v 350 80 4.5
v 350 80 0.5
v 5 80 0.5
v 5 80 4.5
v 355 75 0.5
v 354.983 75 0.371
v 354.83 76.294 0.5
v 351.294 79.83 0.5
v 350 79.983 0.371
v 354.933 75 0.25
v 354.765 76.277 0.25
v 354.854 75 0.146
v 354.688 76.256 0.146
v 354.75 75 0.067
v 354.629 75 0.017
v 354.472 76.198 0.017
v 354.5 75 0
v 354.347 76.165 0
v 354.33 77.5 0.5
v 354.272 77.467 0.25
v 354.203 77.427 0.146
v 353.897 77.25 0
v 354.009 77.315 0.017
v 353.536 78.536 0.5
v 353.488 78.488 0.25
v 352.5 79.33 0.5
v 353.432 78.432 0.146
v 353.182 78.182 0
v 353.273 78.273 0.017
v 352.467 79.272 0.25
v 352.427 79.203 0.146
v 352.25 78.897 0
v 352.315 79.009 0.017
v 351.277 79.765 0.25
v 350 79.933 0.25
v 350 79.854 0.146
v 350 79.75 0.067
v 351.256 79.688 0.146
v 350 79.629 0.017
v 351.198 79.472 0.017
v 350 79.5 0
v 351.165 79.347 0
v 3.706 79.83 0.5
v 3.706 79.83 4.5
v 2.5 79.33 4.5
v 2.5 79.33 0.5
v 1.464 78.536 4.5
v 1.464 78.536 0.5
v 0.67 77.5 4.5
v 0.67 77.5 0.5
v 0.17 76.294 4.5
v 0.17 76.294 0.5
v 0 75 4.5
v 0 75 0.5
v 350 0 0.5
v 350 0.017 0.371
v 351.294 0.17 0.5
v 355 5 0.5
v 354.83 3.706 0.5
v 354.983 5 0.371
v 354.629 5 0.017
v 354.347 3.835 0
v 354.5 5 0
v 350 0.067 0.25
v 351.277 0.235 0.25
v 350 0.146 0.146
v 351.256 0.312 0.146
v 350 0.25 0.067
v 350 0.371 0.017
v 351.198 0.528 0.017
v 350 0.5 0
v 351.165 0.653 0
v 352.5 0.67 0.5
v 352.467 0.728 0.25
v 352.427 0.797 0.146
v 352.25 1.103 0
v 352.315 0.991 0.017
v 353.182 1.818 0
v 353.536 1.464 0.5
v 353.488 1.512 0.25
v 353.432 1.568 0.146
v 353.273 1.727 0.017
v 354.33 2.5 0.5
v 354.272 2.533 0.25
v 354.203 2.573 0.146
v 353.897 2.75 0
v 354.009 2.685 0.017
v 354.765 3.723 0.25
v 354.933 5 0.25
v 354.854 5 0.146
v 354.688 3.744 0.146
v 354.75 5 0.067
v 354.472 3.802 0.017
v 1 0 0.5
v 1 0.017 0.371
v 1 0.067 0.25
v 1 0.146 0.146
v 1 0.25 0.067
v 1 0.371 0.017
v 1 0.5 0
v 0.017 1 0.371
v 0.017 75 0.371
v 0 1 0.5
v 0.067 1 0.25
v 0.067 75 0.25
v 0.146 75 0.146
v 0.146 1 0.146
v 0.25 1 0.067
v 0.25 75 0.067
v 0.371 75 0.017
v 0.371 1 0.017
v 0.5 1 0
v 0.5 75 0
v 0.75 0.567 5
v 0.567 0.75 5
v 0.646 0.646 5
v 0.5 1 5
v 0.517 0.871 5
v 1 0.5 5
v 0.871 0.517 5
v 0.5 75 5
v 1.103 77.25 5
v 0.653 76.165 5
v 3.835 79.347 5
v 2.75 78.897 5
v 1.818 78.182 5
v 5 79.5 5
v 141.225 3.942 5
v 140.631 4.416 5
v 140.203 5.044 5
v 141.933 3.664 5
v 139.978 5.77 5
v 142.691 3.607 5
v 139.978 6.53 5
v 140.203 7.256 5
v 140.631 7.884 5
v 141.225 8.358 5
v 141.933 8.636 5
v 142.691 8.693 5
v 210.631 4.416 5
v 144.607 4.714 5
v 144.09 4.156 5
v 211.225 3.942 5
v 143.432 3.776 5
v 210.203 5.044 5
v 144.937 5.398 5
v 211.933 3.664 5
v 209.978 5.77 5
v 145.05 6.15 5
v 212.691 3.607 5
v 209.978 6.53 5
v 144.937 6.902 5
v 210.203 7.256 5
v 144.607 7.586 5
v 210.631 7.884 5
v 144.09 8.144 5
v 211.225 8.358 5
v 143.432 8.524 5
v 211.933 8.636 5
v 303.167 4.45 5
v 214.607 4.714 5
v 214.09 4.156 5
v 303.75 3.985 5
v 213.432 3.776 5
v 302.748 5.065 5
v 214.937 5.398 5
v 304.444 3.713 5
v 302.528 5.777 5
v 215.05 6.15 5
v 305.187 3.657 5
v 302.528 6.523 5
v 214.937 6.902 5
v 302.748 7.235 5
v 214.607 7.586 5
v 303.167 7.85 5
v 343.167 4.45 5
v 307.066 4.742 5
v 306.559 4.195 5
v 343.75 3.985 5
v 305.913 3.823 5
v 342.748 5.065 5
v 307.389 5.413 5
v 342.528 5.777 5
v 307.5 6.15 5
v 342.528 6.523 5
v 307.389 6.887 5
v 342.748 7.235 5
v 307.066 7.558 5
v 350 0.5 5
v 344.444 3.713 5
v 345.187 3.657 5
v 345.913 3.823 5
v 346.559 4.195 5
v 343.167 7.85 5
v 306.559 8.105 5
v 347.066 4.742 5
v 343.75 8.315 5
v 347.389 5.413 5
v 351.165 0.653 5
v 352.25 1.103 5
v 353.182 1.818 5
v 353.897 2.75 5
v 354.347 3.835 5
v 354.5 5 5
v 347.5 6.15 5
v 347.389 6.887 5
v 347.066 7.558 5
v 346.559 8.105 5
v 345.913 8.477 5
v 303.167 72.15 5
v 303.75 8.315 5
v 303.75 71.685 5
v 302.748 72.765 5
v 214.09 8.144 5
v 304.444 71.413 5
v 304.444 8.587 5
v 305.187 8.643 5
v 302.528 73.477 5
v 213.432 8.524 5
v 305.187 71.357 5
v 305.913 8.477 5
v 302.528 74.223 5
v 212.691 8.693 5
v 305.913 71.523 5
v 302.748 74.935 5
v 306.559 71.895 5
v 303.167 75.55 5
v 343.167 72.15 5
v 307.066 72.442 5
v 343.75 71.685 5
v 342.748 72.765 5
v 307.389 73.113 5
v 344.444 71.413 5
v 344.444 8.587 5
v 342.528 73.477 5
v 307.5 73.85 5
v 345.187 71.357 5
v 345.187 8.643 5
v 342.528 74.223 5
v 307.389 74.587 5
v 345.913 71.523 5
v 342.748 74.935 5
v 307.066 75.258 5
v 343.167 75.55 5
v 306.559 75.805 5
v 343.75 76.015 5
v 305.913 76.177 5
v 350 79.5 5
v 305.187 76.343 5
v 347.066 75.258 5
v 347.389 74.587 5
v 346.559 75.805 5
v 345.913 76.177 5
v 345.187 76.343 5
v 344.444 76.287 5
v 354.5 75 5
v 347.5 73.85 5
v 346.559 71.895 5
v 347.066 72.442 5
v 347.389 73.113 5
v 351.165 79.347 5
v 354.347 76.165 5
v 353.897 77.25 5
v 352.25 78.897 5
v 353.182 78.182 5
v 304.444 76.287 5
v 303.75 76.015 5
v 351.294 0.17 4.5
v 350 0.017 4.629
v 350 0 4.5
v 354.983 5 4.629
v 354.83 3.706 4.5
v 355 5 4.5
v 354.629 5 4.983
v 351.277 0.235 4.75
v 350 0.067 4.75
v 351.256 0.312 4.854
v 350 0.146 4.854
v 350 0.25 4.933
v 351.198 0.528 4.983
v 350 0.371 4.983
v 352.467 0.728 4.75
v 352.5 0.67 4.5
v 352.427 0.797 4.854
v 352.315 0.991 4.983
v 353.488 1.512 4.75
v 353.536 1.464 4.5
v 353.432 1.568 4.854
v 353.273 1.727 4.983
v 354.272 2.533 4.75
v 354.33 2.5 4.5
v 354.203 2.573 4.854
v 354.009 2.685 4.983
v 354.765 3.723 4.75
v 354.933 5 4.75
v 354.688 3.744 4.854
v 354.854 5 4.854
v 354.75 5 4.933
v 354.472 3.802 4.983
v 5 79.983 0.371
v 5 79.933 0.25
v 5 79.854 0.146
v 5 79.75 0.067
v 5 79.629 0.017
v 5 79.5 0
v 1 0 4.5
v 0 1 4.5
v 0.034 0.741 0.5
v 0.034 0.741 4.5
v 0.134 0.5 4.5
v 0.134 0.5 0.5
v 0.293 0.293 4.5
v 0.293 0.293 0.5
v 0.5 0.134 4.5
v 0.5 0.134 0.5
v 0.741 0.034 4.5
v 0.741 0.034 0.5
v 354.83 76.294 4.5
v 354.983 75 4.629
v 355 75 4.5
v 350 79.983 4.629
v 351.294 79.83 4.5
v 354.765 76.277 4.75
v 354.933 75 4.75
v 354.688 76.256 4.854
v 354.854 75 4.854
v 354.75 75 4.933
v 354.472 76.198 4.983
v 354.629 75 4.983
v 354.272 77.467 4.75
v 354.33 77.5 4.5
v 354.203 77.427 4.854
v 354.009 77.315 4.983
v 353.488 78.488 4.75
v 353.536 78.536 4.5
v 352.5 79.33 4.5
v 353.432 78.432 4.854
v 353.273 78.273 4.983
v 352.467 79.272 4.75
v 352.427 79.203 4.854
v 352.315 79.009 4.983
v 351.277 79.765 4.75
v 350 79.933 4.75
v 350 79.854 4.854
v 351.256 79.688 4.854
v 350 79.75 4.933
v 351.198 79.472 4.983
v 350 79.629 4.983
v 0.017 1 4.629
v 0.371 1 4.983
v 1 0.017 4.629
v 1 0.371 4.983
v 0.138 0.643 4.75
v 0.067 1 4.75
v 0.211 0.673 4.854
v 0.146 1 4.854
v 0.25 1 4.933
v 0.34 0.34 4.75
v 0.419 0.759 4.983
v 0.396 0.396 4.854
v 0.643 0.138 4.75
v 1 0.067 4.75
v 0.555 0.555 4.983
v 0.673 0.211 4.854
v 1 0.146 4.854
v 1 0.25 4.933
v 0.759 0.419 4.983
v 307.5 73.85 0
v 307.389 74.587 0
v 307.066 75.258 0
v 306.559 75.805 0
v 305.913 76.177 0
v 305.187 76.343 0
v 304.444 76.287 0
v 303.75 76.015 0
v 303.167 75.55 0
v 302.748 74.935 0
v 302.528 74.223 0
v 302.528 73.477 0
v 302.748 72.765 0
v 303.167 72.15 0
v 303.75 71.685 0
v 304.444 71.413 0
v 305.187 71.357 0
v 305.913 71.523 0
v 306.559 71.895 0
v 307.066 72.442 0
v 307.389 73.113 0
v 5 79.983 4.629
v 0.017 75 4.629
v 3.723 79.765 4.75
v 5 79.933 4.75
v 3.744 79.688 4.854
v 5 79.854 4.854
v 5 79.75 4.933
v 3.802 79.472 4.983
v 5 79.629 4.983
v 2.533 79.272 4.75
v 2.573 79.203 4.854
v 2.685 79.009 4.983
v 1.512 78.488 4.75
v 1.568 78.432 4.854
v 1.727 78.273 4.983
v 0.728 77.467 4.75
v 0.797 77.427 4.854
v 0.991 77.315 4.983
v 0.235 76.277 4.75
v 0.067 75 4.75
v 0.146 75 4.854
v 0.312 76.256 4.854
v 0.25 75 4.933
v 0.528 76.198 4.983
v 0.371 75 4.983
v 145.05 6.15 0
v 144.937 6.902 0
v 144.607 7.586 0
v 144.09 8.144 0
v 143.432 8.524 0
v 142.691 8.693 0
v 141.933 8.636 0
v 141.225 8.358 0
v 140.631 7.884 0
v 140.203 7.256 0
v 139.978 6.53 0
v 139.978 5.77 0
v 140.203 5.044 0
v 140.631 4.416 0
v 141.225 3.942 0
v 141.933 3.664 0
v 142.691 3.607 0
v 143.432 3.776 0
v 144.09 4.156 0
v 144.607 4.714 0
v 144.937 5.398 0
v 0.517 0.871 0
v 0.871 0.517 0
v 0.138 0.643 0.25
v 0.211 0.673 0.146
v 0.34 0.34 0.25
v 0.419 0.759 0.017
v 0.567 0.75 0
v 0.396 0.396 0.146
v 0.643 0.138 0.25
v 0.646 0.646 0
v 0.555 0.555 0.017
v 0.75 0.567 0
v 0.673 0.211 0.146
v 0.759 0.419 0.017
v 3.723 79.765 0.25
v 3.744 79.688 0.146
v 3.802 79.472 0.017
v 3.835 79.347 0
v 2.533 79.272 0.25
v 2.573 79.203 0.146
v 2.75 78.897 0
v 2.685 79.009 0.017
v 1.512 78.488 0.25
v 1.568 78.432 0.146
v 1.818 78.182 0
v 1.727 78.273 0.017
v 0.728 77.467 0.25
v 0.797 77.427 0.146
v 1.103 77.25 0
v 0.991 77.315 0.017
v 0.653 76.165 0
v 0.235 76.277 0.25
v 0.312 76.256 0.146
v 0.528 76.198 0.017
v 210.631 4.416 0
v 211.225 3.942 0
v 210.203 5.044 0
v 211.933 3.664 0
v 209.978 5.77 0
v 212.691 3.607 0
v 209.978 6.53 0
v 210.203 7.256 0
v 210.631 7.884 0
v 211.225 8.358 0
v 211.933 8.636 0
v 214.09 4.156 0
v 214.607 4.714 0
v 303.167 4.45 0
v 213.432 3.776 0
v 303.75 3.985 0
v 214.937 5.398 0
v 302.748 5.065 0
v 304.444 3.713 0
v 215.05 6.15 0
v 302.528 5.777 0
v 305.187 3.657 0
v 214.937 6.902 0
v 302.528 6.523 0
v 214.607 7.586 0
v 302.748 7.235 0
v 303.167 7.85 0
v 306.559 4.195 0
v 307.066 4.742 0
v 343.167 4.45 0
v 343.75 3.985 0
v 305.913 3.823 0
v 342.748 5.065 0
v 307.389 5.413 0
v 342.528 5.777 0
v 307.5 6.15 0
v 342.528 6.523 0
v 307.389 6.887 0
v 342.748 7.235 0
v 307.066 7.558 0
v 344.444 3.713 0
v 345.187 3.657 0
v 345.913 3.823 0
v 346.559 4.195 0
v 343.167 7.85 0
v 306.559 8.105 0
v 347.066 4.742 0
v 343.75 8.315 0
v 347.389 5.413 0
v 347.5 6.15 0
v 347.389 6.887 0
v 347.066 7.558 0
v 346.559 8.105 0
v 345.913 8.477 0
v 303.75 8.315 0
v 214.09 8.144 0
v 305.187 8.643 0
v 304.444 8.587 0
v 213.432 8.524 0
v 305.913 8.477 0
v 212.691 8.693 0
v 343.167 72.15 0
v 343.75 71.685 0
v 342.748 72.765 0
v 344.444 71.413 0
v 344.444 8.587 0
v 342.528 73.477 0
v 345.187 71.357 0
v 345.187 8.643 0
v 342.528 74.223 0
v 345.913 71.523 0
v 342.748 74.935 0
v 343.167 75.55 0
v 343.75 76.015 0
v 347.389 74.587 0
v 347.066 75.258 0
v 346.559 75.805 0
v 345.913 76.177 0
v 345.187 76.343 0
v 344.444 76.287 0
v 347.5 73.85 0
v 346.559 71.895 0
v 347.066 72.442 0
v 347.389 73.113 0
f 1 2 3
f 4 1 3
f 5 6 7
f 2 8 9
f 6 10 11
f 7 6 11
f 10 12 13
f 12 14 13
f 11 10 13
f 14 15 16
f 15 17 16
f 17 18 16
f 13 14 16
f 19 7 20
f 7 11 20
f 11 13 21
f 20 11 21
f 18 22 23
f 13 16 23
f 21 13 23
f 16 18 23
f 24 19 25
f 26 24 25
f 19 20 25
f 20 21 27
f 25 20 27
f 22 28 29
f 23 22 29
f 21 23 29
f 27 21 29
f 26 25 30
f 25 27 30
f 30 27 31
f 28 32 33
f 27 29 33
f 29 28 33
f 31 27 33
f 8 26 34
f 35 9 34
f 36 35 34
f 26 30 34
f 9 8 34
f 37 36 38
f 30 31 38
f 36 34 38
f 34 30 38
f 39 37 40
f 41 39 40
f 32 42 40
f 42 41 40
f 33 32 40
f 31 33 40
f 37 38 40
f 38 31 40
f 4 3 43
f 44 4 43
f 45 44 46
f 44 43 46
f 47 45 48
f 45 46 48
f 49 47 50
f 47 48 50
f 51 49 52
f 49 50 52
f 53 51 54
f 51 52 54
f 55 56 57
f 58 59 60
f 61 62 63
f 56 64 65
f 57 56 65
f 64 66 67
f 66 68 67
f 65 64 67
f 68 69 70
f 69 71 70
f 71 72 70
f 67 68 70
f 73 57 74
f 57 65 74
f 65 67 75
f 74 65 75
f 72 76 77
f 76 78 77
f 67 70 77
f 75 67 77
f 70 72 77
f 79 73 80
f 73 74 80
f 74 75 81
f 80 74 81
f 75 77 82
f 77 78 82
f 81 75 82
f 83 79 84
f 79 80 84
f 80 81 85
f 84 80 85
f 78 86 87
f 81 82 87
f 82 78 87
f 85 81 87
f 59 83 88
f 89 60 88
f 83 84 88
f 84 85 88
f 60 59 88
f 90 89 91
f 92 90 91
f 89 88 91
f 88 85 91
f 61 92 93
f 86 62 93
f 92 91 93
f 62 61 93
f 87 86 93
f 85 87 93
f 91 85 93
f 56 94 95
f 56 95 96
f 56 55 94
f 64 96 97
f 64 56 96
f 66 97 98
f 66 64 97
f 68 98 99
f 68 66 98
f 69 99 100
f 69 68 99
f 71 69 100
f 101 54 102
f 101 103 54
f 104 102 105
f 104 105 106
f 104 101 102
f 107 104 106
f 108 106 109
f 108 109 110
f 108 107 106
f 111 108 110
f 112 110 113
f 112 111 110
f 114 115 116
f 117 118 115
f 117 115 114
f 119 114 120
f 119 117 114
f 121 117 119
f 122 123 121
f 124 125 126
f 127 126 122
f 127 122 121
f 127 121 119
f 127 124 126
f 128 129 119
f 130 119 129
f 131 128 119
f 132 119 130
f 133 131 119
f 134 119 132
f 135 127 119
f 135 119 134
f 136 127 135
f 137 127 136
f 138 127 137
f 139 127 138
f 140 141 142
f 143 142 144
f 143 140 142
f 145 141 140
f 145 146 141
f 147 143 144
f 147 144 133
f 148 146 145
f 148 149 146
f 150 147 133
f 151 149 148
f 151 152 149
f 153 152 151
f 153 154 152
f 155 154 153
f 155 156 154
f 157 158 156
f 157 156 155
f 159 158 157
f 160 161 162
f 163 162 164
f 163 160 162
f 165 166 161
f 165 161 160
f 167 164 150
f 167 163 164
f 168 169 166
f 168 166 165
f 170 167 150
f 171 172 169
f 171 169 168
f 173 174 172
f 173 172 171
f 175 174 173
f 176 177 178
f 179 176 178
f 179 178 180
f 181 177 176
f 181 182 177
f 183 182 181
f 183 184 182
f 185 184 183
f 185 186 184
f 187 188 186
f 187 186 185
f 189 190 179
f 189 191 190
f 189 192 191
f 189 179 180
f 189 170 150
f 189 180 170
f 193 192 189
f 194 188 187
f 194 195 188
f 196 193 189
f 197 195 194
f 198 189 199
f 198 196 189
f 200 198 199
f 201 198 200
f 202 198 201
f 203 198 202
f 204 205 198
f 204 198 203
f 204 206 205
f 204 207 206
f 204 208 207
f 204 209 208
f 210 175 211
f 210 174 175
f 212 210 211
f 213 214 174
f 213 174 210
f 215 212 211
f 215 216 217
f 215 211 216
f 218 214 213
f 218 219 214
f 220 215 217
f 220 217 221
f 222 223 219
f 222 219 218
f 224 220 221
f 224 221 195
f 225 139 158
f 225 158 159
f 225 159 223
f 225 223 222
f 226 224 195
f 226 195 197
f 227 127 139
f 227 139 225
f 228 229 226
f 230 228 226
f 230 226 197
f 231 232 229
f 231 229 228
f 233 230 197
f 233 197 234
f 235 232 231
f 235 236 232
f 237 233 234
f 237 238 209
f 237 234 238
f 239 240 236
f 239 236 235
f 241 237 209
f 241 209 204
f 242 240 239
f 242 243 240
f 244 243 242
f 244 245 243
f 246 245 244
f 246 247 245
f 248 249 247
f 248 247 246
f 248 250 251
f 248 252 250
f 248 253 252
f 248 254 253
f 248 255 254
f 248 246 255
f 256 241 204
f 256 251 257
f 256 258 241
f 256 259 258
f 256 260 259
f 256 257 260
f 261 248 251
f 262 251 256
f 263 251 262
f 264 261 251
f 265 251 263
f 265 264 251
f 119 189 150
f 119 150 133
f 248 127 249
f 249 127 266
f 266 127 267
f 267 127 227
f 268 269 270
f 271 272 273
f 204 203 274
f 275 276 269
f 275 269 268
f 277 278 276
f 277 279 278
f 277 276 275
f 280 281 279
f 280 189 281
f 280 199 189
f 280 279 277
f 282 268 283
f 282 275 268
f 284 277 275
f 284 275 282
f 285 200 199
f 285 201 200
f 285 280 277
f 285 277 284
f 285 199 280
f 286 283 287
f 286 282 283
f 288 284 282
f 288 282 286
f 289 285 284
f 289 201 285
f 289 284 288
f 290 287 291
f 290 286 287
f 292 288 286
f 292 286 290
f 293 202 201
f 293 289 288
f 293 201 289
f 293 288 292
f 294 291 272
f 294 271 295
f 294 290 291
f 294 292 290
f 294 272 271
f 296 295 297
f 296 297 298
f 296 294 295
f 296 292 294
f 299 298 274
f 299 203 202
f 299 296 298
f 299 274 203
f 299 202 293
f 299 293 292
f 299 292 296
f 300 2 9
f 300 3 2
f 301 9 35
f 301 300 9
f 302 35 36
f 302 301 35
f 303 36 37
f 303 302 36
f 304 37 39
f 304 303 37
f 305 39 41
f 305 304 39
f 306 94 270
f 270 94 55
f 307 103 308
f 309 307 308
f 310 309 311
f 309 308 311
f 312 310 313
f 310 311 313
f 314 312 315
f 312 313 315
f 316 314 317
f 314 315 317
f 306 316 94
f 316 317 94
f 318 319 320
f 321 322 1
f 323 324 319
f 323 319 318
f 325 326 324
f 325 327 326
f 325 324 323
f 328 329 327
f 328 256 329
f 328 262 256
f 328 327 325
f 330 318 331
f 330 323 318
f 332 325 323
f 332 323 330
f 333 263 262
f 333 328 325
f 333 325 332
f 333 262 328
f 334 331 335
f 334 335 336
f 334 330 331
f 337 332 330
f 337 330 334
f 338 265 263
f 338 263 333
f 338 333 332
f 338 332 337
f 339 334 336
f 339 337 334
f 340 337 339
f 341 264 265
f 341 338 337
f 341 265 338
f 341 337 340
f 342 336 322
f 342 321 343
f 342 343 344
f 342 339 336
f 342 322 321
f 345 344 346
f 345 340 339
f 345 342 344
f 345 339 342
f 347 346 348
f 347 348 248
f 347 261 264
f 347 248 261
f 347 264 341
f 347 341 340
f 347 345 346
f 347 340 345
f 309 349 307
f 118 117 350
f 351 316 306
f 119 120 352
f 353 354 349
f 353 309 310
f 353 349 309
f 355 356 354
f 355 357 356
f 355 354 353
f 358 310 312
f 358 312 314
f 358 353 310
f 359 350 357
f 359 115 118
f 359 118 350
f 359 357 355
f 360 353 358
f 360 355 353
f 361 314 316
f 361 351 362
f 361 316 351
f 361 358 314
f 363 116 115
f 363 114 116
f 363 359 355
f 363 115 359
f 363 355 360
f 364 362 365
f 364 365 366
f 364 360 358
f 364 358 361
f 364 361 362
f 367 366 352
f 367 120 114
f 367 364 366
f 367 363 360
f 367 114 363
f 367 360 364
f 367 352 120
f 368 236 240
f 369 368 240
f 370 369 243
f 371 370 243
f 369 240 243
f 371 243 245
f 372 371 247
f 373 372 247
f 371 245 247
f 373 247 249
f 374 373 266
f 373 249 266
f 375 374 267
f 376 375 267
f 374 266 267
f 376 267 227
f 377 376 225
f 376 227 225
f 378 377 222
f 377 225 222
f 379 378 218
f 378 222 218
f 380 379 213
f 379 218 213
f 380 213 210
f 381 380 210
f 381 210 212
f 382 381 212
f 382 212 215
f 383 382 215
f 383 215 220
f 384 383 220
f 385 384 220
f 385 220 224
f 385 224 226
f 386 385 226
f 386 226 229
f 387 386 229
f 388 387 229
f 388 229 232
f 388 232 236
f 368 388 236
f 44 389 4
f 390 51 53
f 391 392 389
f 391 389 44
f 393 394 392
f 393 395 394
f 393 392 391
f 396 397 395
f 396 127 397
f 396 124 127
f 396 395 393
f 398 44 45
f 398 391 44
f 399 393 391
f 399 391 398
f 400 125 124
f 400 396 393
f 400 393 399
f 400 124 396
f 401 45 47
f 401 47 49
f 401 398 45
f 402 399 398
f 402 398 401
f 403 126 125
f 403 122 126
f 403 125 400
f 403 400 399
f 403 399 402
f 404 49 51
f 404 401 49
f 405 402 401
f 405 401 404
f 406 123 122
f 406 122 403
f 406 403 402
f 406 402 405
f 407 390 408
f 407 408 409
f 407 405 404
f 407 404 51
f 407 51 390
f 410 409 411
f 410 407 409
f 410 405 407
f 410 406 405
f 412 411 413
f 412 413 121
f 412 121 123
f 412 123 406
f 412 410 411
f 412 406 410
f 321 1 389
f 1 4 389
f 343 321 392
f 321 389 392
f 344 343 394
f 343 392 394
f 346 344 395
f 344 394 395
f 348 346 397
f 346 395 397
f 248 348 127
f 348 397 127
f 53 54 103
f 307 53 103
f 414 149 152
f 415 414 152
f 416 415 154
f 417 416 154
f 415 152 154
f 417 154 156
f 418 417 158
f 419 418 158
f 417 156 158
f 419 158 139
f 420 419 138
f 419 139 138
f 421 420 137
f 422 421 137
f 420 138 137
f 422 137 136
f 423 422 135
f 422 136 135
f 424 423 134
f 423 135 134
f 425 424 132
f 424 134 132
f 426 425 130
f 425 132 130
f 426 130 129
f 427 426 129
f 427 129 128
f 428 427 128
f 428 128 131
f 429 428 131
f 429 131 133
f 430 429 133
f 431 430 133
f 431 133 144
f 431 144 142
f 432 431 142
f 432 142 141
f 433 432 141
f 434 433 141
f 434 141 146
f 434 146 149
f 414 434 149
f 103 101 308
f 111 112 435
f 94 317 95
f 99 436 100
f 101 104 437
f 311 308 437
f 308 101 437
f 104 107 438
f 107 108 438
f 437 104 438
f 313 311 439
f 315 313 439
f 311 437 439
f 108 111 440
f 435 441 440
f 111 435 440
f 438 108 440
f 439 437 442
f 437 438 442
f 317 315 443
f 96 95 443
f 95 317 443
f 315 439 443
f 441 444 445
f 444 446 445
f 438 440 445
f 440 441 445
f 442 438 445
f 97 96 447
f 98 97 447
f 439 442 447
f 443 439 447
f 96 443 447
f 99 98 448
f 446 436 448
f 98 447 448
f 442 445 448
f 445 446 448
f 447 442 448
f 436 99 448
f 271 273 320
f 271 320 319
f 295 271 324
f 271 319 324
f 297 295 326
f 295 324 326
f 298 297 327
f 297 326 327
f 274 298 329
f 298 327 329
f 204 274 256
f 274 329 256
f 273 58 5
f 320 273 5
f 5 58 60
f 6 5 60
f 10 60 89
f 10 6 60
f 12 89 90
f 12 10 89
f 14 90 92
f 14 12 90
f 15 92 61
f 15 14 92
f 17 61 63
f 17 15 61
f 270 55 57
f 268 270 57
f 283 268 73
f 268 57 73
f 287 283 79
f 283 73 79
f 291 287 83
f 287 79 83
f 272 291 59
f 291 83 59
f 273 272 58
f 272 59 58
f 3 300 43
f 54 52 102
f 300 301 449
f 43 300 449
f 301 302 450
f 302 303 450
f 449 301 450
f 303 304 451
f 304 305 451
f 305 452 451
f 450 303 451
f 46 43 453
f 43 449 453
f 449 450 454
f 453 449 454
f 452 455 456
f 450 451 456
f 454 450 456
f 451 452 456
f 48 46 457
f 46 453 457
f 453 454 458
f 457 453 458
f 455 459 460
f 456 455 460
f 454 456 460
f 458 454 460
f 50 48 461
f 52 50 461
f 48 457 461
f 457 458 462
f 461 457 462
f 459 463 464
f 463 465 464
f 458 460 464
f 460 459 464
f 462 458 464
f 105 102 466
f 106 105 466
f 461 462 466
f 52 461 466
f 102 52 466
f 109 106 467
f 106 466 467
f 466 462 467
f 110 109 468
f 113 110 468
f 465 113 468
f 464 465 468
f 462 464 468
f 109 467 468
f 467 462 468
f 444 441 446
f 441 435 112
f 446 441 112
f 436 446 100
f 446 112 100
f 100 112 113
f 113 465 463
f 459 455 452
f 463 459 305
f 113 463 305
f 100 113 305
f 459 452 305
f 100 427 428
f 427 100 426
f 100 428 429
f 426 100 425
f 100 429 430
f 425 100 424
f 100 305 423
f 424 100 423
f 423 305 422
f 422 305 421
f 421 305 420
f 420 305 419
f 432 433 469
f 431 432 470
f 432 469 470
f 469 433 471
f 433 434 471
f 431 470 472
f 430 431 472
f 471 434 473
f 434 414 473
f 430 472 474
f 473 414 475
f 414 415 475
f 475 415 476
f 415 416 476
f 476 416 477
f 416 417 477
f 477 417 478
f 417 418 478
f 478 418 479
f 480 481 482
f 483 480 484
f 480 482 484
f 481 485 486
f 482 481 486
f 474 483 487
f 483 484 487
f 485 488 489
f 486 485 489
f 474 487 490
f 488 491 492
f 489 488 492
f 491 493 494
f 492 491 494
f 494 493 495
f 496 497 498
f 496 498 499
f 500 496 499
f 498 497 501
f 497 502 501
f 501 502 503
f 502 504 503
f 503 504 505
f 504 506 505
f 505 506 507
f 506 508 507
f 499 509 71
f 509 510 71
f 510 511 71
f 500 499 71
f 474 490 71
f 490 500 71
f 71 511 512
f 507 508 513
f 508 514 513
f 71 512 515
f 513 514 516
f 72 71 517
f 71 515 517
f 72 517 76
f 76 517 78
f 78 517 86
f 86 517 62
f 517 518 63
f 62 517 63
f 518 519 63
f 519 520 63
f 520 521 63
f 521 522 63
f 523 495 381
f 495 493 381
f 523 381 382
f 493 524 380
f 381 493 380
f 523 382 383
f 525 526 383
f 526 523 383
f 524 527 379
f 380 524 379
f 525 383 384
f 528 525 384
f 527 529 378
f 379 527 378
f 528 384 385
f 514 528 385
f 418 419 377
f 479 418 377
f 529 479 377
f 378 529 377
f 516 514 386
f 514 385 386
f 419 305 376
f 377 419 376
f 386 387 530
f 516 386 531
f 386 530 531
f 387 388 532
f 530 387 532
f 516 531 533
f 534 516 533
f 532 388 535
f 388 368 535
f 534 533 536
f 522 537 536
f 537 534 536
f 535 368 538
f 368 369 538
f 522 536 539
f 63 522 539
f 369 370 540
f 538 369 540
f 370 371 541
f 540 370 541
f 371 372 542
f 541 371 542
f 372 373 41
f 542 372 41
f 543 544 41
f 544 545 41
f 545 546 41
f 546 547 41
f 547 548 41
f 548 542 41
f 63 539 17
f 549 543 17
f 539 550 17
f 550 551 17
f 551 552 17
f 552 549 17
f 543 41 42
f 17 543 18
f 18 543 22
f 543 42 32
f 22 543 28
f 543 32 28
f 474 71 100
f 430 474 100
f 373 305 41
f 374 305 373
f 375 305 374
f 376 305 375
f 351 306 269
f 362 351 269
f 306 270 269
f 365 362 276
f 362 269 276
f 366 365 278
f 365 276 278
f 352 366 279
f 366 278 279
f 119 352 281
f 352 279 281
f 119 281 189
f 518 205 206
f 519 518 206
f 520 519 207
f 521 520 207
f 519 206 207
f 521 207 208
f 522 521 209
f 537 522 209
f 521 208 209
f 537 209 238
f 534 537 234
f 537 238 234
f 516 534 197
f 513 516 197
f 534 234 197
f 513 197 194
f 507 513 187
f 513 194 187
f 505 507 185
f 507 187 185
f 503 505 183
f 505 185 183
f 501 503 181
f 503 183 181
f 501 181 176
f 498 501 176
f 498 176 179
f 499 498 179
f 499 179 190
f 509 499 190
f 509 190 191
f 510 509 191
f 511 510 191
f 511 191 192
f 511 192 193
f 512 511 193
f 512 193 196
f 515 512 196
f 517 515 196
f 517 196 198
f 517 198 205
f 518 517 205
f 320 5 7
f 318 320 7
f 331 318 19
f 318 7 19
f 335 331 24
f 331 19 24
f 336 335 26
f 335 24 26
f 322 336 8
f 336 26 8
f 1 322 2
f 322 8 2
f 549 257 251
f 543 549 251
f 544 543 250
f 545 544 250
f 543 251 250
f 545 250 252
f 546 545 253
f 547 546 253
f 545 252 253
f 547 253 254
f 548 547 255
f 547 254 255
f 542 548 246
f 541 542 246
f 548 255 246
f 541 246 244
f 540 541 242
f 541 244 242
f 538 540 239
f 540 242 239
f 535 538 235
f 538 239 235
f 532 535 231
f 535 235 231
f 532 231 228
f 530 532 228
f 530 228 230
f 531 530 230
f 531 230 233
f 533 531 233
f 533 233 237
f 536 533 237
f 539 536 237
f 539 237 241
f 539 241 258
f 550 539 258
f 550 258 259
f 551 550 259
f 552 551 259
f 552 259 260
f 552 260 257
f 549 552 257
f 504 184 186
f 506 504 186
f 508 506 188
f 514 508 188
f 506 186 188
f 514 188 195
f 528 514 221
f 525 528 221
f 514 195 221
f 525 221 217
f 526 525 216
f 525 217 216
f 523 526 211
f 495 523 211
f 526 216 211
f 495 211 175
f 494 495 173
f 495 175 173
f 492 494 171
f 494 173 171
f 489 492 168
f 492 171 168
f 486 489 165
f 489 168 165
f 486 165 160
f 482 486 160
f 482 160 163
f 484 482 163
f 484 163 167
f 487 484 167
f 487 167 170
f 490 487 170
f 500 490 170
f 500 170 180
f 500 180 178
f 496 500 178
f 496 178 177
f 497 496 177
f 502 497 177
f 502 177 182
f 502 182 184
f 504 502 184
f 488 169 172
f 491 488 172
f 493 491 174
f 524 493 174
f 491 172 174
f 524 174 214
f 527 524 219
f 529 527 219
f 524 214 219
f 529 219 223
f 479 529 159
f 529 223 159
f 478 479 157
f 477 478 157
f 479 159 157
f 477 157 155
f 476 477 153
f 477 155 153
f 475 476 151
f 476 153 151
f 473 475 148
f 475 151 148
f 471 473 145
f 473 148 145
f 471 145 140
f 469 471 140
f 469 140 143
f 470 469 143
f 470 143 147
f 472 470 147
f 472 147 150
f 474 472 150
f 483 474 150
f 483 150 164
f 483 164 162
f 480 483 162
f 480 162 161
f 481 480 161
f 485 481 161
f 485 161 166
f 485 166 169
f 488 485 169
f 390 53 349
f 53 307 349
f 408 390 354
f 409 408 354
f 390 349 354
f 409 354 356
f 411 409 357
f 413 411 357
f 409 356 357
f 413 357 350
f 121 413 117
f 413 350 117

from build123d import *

# Parameters (mm, degrees)
F1_DEPTH = 5
F2_R     = 0.5
F3_R     = 2.5
F4_DEPTH = 25
F5_R     = 2.55
F6_DEPTH = 25


with BuildPart() as f1:
    # F0 (on Top) → F1 (new body)
    with BuildSketch(Plane.XY):
        with BuildLine():
            ThreePointArc((0, 1), (0.292893, 0.292893), (1, 0))
            Line((1, 0), (350, 0))
            ThreePointArc((350, 0), (353.535534, 1.464466), (355, 5))
            Line((355, 5), (355, 75))
            ThreePointArc((355, 75), (353.535534, 78.535534), (350, 80))
            Line((350, 80), (5, 80))
            ThreePointArc((5, 80), (1.464466, 78.535534), (0, 75))
            Line((0, 75), (0, 1))
        make_face()
    extrude(amount=F1_DEPTH)

    # F2
    f2_edges = [f1.edges().sort_by_distance(p)[0] for p in [
        (0, 38, 5),
        (0.292893, 0.292893, 5),
        (175.5, 0, 5),
        (353.535534, 1.464466, 5),
        (355, 40, 5),
        (353.535534, 78.535534, 5),
        (177.5, 80, 5),
        (1.464466, 78.535534, 5),
        (0, 38, 0),
        (0.292893, 0.292893, 0),
        (175.5, 0, 0),
        (353.535534, 1.464466, 0),
        (355, 40, 0),
        (353.535534, 78.535534, 0),
        (177.5, 80, 0),
        (1.464466, 78.535534, 0),
    ]]
    fillet(f2_edges, radius=F2_R)

    # F3 (on face) → F4 (cut)
    with BuildSketch(Plane.XY.offset(5)):
        with Locations((345, 73.85)):
            Circle(F3_R)
        with Locations((345, 6.15)):
            Circle(F3_R)
        with Locations((305, 73.85)):
            Circle(F3_R)
        with Locations((305, 6.15)):
            Circle(F3_R)
    extrude(amount=-F4_DEPTH, mode=Mode.SUBTRACT)

    # F5 (on face) → F6 (cut)
    with BuildSketch(Plane.XY.offset(5)):
        with Locations((142.5, 6.15)):
            Circle(F5_R)
        with Locations((212.5, 6.15)):
            Circle(F5_R)
    extrude(amount=-F6_DEPTH, mode=Mode.SUBTRACT)


solid = f1.part
